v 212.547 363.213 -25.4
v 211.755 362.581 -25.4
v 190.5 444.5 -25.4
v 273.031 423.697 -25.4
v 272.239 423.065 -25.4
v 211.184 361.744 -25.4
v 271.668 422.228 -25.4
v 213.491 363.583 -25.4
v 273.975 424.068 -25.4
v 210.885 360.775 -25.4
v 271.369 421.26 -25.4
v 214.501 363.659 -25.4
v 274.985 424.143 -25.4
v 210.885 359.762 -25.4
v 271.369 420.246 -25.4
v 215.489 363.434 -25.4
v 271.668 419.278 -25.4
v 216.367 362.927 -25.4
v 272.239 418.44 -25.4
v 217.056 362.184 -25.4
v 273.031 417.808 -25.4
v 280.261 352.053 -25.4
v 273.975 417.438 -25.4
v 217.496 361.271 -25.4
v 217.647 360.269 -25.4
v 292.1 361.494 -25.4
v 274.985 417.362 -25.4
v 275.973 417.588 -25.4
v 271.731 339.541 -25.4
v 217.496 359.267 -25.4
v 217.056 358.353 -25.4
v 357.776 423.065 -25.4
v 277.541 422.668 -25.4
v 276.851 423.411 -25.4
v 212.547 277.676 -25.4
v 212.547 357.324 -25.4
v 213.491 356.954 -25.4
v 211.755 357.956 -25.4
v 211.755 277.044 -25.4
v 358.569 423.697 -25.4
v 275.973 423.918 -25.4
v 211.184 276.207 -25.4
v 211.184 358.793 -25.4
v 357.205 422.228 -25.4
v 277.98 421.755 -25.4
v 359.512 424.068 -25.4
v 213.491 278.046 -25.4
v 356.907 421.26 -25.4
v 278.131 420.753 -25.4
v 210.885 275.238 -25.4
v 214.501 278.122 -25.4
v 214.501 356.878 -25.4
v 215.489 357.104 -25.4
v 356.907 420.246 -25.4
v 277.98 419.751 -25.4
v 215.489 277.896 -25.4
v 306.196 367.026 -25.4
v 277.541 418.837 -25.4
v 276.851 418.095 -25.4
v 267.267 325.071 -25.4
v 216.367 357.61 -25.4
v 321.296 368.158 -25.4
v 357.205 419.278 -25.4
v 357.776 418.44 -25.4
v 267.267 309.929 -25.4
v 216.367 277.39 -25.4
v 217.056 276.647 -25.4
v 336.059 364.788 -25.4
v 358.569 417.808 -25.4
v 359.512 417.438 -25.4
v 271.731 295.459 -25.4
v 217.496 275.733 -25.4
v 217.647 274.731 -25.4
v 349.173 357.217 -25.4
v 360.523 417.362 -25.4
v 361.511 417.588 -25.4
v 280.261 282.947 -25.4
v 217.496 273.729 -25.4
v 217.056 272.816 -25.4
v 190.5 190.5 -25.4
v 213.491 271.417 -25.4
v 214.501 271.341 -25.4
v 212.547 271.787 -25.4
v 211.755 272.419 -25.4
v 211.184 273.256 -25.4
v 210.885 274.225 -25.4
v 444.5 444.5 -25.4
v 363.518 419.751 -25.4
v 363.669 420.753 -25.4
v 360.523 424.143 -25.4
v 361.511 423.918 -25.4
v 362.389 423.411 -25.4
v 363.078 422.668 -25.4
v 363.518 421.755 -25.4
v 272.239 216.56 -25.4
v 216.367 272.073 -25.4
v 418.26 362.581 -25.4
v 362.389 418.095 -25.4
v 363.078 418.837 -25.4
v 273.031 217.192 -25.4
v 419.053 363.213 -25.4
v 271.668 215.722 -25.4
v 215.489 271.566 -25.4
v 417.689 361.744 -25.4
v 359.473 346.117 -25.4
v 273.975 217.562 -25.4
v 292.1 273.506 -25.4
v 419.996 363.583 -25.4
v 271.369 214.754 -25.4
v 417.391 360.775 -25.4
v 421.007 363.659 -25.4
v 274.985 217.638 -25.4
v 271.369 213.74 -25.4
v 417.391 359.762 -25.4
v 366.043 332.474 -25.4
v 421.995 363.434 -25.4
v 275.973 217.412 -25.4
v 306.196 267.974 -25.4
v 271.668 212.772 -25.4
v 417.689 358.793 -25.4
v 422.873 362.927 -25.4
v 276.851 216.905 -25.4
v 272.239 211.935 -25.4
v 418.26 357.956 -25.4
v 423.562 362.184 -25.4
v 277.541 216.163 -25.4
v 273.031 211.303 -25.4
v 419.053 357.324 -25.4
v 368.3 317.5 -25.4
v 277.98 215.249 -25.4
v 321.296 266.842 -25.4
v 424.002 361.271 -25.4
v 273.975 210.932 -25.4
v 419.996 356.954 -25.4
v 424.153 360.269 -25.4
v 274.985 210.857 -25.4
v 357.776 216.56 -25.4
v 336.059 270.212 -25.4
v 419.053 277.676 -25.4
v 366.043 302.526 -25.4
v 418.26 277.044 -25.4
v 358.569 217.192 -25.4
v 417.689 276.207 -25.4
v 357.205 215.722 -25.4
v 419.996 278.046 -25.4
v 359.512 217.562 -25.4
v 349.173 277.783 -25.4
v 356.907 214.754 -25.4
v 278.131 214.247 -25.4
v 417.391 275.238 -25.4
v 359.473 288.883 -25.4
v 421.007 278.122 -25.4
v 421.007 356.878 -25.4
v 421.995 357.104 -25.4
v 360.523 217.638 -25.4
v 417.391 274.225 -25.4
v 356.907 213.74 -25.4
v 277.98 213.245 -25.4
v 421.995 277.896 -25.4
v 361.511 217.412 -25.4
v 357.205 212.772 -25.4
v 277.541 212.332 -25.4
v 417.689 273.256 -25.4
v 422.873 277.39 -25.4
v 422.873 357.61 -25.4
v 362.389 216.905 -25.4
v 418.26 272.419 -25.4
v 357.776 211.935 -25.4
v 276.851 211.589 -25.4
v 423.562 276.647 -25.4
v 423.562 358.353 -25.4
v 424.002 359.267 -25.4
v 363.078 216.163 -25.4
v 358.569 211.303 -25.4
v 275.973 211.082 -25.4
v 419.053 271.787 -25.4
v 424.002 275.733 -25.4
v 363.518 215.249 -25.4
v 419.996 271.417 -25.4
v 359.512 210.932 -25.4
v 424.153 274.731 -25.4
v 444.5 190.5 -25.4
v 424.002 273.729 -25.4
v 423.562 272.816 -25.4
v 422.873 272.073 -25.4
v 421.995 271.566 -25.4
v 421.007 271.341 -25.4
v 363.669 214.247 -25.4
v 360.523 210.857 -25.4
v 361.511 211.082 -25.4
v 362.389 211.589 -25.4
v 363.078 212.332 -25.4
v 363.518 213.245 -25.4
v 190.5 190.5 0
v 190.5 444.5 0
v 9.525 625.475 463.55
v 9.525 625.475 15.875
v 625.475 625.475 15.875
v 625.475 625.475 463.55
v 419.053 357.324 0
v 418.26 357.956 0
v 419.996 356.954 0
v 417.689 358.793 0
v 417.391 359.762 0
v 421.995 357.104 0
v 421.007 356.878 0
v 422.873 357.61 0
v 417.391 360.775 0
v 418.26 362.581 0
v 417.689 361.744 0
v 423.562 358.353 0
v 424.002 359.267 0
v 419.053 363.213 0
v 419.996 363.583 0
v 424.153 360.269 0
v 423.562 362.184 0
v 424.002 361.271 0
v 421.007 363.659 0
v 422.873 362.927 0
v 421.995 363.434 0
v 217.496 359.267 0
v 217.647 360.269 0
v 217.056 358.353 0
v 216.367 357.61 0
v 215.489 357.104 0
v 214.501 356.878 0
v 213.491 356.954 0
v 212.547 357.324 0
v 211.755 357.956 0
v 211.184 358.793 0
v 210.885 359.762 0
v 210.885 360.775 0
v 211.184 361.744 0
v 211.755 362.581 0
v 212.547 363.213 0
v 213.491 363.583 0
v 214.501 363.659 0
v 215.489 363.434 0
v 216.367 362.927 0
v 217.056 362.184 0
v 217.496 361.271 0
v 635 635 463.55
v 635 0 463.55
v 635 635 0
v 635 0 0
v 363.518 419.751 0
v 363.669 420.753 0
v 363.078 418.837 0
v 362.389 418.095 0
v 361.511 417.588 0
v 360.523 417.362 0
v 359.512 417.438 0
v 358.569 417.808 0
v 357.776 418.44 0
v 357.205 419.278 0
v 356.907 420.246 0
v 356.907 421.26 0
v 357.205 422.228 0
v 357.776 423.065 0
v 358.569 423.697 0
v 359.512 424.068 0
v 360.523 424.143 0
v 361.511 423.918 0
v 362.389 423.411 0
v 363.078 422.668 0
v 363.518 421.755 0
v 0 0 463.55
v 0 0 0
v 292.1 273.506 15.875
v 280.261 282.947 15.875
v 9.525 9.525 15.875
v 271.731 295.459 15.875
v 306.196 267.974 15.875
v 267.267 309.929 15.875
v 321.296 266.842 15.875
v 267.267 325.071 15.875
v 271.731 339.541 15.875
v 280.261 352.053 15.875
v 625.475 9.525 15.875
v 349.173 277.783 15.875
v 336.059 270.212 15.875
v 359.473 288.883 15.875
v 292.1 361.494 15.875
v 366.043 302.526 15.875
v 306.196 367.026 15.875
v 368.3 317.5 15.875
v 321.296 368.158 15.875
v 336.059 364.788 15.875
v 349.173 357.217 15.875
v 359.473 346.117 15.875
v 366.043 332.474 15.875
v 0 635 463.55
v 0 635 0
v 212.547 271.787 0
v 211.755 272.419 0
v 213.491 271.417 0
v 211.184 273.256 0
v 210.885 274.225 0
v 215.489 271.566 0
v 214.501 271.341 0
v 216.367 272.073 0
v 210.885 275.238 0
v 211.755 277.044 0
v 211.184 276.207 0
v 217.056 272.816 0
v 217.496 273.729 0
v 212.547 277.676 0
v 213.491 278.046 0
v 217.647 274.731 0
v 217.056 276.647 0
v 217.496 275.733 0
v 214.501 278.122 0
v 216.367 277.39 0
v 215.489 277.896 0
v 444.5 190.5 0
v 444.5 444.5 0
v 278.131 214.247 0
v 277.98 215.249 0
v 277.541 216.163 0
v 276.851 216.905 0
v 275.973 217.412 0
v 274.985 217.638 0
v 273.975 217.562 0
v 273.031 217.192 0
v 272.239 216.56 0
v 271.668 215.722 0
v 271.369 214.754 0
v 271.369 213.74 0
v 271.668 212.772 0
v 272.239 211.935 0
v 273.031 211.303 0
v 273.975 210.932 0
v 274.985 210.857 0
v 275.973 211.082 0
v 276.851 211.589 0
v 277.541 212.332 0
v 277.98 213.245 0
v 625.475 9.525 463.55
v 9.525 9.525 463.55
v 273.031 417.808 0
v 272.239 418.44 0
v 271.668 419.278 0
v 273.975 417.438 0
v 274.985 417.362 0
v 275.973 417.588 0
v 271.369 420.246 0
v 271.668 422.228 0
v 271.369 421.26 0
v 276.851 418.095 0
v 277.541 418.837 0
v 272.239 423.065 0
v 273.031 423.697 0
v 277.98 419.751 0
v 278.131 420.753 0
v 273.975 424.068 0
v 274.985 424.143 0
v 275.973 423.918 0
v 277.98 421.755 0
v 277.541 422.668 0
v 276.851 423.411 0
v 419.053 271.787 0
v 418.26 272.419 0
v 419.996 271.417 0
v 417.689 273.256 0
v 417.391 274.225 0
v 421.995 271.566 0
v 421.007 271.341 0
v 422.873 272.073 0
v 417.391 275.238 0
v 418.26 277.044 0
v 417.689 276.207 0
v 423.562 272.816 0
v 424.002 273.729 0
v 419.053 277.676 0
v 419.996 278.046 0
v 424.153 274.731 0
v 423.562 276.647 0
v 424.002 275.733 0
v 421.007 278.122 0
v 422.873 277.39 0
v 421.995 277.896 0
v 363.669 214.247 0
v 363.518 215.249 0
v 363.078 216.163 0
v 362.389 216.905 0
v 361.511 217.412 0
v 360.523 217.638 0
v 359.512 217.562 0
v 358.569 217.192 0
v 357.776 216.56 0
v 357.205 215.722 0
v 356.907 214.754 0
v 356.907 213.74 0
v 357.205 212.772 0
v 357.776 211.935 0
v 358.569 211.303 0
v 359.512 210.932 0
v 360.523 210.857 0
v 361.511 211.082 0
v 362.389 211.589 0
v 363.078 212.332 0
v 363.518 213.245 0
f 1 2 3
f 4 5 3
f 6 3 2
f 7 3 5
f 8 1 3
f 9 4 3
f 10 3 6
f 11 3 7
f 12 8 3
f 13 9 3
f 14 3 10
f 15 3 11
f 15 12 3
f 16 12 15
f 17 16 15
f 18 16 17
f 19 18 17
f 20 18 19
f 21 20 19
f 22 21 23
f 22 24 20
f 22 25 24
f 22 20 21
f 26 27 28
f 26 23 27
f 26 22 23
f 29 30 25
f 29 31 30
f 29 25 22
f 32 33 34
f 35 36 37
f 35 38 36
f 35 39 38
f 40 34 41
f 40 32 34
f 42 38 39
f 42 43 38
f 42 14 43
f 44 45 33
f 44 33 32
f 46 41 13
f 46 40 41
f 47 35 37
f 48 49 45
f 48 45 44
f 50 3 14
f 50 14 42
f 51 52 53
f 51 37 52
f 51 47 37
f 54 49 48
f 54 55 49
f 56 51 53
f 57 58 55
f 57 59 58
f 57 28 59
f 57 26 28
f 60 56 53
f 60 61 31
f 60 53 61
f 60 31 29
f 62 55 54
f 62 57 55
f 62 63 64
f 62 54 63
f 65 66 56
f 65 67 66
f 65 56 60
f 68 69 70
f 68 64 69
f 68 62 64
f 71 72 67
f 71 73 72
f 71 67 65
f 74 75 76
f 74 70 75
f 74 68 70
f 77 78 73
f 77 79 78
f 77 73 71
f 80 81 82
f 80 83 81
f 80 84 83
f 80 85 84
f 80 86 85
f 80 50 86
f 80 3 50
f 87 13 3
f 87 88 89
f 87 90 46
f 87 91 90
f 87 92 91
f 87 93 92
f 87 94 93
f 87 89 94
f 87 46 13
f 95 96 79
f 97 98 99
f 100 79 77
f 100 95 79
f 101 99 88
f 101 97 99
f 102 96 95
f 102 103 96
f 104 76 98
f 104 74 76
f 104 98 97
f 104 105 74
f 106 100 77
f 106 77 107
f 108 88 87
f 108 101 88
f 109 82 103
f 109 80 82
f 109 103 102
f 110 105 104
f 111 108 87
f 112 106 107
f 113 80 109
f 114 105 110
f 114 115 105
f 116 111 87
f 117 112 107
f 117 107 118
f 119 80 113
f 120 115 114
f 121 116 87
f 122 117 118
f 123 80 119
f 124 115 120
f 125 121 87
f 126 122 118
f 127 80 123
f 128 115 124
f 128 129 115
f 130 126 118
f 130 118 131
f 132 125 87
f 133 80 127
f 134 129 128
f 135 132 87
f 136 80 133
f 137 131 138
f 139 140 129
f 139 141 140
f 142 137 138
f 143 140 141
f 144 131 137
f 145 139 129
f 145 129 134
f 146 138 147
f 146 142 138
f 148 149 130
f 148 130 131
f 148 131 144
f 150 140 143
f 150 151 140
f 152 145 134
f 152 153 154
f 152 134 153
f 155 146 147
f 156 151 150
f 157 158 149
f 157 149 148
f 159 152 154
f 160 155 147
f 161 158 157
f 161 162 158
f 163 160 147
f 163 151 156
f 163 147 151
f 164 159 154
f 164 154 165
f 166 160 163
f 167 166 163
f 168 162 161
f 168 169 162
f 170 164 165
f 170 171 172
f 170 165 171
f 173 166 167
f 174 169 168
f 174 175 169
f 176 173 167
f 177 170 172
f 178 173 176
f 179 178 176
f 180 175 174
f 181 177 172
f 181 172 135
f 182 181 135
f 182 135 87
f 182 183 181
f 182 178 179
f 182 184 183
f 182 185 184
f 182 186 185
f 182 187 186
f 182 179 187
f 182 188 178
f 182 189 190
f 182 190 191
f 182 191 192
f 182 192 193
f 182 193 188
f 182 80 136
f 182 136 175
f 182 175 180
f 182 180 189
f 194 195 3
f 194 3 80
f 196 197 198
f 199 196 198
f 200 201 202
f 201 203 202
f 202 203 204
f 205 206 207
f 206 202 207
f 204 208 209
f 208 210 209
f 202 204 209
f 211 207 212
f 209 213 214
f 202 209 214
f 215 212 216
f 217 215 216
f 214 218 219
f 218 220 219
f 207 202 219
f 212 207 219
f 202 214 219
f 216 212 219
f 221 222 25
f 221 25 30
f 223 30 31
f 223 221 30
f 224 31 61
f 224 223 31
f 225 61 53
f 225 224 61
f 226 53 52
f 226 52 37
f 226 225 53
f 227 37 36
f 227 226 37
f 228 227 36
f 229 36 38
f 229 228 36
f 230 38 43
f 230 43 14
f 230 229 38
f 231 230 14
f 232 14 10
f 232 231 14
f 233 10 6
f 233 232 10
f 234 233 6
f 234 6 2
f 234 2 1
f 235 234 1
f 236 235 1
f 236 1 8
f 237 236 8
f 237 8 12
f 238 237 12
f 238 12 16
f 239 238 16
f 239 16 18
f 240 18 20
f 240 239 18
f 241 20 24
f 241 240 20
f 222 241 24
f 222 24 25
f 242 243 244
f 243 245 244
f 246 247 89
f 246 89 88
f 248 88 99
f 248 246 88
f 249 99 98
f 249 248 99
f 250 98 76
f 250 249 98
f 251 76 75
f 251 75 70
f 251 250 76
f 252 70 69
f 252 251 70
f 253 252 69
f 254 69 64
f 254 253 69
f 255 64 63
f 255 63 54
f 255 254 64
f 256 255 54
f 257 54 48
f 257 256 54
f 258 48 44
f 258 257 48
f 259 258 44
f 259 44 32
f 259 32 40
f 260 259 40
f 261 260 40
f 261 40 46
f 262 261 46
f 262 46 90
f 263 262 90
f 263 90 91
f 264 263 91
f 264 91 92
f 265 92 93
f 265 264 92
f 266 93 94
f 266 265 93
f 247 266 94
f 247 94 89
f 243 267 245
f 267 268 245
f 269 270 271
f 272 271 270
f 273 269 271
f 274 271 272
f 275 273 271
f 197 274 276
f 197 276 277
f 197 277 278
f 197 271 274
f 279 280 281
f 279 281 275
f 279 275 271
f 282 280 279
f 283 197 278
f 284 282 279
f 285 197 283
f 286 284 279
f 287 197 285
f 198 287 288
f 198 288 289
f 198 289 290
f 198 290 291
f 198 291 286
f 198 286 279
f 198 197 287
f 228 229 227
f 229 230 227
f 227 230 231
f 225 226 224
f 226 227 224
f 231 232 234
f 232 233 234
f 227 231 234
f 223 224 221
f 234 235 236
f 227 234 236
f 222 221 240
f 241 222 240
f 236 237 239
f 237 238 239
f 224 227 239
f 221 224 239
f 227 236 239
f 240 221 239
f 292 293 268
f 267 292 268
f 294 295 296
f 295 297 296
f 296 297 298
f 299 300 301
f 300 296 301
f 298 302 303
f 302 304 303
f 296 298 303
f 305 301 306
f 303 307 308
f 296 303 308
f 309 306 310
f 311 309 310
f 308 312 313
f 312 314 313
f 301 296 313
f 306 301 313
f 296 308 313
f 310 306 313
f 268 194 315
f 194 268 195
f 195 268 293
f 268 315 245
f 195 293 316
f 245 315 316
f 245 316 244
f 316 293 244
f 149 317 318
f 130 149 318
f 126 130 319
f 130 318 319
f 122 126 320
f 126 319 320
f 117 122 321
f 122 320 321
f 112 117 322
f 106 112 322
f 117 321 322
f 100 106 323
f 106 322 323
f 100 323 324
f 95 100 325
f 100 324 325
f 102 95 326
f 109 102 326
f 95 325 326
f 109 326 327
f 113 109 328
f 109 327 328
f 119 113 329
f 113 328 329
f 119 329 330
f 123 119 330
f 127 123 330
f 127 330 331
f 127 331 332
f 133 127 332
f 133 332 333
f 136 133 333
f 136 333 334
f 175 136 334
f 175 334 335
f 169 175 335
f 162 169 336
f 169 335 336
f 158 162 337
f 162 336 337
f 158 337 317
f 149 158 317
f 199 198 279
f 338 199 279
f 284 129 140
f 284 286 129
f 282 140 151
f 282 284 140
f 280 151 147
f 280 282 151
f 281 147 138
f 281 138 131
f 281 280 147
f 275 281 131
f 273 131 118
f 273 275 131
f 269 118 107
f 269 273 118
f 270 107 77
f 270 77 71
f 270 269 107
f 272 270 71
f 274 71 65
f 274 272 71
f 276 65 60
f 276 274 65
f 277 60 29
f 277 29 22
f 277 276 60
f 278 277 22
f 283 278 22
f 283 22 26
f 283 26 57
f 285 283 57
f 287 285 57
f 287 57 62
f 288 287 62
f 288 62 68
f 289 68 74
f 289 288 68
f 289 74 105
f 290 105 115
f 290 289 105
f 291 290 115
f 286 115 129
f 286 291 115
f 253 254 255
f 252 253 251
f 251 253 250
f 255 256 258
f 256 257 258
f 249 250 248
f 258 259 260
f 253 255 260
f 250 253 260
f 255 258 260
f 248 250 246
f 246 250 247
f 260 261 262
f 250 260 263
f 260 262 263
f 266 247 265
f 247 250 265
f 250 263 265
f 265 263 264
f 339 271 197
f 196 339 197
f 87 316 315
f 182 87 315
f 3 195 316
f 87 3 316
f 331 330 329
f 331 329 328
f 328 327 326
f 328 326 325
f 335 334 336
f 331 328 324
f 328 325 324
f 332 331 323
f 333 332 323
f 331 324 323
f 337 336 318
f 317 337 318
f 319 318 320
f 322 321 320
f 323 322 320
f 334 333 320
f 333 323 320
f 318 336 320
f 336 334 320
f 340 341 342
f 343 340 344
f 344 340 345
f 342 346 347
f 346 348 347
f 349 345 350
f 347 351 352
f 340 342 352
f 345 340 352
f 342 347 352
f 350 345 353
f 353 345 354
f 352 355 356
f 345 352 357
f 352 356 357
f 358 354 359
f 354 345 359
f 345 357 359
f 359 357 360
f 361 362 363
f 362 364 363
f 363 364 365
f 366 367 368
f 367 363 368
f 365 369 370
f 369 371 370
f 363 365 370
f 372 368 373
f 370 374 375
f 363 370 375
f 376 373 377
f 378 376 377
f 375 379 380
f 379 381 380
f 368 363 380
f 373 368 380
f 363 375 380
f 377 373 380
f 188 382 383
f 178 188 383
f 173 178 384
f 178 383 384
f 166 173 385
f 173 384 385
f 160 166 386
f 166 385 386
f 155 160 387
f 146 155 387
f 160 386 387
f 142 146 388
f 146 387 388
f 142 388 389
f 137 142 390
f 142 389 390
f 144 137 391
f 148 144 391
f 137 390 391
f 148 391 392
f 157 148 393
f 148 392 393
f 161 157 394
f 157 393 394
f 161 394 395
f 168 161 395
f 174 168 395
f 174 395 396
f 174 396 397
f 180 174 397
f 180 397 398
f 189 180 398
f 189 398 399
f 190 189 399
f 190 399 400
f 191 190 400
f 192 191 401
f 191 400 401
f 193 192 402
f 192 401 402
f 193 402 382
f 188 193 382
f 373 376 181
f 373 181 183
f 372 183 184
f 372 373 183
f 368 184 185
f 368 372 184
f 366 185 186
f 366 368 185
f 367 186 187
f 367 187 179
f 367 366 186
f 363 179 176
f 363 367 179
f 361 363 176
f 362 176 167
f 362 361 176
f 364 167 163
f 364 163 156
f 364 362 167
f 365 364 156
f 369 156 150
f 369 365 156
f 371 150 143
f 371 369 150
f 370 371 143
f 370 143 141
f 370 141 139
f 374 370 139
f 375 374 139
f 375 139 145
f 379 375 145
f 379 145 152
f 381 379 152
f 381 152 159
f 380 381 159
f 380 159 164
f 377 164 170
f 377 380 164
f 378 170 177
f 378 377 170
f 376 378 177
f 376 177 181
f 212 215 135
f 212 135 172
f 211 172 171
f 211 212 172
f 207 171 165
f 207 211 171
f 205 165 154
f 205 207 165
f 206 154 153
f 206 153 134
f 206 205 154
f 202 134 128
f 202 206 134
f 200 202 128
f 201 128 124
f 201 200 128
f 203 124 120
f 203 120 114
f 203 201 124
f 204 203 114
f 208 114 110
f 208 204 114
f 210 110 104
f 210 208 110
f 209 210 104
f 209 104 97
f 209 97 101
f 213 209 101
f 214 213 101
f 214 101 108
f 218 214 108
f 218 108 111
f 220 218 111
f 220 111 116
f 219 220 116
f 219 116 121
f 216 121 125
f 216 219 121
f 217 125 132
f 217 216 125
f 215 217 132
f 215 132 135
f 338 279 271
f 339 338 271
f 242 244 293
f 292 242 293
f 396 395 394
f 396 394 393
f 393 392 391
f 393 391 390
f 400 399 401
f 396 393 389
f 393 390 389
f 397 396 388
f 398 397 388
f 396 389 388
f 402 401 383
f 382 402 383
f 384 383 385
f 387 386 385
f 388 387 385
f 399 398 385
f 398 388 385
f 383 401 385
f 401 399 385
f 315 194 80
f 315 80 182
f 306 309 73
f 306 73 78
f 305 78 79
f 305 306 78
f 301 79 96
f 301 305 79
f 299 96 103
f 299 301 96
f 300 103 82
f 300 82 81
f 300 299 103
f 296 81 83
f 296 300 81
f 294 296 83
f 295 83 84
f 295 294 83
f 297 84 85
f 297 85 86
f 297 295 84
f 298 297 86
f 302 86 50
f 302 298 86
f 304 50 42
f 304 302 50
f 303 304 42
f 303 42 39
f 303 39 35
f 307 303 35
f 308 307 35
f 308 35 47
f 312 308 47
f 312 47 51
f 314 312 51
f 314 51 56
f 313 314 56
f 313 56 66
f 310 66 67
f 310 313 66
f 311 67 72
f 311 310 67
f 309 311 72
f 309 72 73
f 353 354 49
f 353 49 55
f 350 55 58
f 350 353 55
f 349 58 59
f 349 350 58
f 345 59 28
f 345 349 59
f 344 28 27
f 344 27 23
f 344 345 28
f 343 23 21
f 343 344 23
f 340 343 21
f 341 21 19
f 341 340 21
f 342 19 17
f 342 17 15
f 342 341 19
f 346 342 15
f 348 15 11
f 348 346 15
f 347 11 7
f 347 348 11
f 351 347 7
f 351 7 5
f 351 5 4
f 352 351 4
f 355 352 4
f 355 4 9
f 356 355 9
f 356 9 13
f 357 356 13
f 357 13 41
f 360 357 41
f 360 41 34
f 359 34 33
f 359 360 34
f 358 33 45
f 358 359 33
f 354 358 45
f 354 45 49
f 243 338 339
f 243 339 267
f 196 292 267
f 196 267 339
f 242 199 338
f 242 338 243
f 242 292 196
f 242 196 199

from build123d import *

# Parameters (mm, degrees)
F0_W     = 635
F0_H     = 635
F1_DEPTH = 15.875
F3_DEPTH = 447.675
F4_R     = 50.8
F5_DEPTH = 25.4
F6_W     = 254
F6_H     = 254
F6_R     = 3.4000059
F6_R_2   = 50.8
F7_DEPTH = 25.4


with BuildPart() as f1:
    # F0 (on Top) → F1 (new body)
    with BuildSketch(Plane.XY):
        with Locations((317.5, 317.5)):
            Rectangle(F0_W, F0_H)
    extrude(amount=F1_DEPTH)

    # F2 (on face) → F3 (join)
    with BuildSketch(Plane.XY.offset(15.875)):
        Polygon((0, 635), (0, 625.475), (9.525, 625.475), (625.475, 625.475), (625.475, 635), align=None)
        Polygon((0, 625.475), (0, 0), (9.525, 0), (9.525, 9.525), (9.525, 625.475), align=None)
        Polygon((9.525, 9.525), (9.525, 0), (635, 0), (635, 9.525), (625.475, 9.525), align=None)
        Polygon((625.475, 625.475), (625.475, 9.525), (635, 9.525), (635, 635), (625.475, 635), align=None)
    extrude(amount=F3_DEPTH)

    # F4 (on face) → F5 (cut, symmetric)
    with BuildSketch(Plane(origin=(0, 0, 0), x_dir=(1, 0, 0), z_dir=(0, 0, -1))):
        with Locations((317.5, -317.5)):
            Circle(F4_R)
    extrude(amount=F5_DEPTH, both=True, mode=Mode.SUBTRACT)

    # F6 (on face) → F7 (join)
    with BuildSketch(Plane(origin=(0, 0, 0), x_dir=(1, 0, 0), z_dir=(0, 0, -1))):
        with Locations((317.5, -317.5)):
            Rectangle(F6_W, F6_H)
        with Locations((274.7312995989, -420.7527765535)):
            Circle(F6_R, mode=Mode.SUBTRACT)
        with Locations((214.2472234465, -360.2687004011)):
            Circle(F6_R, mode=Mode.SUBTRACT)
        with Locations((360.2687004011, -420.7527765535)):
            Circle(F6_R, mode=Mode.SUBTRACT)
        with Locations((420.7527765535, -360.2687004011)):
            Circle(F6_R, mode=Mode.SUBTRACT)
        with Locations((214.2472234465, -274.7312995989)):
            Circle(F6_R, mode=Mode.SUBTRACT)
        with BuildLine():
            ThreePointArc((271.3312936989, -214.2472234465), (274.7312995989, -210.8472175465), (278.1313054989, -214.2472234465))
            ThreePointArc((278.1313054989, -214.2472234465), (274.7312995989, -217.6472293465), (271.3312936989, -214.2472234465))
        make_face(mode=Mode.SUBTRACT)
        with Locations((317.5, -317.5)):
            Circle(F6_R_2, mode=Mode.SUBTRACT)
        with Locations((420.7527765535, -274.7312995989)):
            Circle(F6_R, mode=Mode.SUBTRACT)
        with BuildLine():
            ThreePointArc((356.8686945011, -214.2472234465), (360.2687004011, -210.8472175465), (363.6687063011, -214.2472234465))
            ThreePointArc((363.6687063011, -214.2472234465), (360.2687004011, -217.6472293465), (356.8686945011, -214.2472234465))
        make_face(mode=Mode.SUBTRACT)
    extrude(amount=F7_DEPTH)


solid = f1.part
